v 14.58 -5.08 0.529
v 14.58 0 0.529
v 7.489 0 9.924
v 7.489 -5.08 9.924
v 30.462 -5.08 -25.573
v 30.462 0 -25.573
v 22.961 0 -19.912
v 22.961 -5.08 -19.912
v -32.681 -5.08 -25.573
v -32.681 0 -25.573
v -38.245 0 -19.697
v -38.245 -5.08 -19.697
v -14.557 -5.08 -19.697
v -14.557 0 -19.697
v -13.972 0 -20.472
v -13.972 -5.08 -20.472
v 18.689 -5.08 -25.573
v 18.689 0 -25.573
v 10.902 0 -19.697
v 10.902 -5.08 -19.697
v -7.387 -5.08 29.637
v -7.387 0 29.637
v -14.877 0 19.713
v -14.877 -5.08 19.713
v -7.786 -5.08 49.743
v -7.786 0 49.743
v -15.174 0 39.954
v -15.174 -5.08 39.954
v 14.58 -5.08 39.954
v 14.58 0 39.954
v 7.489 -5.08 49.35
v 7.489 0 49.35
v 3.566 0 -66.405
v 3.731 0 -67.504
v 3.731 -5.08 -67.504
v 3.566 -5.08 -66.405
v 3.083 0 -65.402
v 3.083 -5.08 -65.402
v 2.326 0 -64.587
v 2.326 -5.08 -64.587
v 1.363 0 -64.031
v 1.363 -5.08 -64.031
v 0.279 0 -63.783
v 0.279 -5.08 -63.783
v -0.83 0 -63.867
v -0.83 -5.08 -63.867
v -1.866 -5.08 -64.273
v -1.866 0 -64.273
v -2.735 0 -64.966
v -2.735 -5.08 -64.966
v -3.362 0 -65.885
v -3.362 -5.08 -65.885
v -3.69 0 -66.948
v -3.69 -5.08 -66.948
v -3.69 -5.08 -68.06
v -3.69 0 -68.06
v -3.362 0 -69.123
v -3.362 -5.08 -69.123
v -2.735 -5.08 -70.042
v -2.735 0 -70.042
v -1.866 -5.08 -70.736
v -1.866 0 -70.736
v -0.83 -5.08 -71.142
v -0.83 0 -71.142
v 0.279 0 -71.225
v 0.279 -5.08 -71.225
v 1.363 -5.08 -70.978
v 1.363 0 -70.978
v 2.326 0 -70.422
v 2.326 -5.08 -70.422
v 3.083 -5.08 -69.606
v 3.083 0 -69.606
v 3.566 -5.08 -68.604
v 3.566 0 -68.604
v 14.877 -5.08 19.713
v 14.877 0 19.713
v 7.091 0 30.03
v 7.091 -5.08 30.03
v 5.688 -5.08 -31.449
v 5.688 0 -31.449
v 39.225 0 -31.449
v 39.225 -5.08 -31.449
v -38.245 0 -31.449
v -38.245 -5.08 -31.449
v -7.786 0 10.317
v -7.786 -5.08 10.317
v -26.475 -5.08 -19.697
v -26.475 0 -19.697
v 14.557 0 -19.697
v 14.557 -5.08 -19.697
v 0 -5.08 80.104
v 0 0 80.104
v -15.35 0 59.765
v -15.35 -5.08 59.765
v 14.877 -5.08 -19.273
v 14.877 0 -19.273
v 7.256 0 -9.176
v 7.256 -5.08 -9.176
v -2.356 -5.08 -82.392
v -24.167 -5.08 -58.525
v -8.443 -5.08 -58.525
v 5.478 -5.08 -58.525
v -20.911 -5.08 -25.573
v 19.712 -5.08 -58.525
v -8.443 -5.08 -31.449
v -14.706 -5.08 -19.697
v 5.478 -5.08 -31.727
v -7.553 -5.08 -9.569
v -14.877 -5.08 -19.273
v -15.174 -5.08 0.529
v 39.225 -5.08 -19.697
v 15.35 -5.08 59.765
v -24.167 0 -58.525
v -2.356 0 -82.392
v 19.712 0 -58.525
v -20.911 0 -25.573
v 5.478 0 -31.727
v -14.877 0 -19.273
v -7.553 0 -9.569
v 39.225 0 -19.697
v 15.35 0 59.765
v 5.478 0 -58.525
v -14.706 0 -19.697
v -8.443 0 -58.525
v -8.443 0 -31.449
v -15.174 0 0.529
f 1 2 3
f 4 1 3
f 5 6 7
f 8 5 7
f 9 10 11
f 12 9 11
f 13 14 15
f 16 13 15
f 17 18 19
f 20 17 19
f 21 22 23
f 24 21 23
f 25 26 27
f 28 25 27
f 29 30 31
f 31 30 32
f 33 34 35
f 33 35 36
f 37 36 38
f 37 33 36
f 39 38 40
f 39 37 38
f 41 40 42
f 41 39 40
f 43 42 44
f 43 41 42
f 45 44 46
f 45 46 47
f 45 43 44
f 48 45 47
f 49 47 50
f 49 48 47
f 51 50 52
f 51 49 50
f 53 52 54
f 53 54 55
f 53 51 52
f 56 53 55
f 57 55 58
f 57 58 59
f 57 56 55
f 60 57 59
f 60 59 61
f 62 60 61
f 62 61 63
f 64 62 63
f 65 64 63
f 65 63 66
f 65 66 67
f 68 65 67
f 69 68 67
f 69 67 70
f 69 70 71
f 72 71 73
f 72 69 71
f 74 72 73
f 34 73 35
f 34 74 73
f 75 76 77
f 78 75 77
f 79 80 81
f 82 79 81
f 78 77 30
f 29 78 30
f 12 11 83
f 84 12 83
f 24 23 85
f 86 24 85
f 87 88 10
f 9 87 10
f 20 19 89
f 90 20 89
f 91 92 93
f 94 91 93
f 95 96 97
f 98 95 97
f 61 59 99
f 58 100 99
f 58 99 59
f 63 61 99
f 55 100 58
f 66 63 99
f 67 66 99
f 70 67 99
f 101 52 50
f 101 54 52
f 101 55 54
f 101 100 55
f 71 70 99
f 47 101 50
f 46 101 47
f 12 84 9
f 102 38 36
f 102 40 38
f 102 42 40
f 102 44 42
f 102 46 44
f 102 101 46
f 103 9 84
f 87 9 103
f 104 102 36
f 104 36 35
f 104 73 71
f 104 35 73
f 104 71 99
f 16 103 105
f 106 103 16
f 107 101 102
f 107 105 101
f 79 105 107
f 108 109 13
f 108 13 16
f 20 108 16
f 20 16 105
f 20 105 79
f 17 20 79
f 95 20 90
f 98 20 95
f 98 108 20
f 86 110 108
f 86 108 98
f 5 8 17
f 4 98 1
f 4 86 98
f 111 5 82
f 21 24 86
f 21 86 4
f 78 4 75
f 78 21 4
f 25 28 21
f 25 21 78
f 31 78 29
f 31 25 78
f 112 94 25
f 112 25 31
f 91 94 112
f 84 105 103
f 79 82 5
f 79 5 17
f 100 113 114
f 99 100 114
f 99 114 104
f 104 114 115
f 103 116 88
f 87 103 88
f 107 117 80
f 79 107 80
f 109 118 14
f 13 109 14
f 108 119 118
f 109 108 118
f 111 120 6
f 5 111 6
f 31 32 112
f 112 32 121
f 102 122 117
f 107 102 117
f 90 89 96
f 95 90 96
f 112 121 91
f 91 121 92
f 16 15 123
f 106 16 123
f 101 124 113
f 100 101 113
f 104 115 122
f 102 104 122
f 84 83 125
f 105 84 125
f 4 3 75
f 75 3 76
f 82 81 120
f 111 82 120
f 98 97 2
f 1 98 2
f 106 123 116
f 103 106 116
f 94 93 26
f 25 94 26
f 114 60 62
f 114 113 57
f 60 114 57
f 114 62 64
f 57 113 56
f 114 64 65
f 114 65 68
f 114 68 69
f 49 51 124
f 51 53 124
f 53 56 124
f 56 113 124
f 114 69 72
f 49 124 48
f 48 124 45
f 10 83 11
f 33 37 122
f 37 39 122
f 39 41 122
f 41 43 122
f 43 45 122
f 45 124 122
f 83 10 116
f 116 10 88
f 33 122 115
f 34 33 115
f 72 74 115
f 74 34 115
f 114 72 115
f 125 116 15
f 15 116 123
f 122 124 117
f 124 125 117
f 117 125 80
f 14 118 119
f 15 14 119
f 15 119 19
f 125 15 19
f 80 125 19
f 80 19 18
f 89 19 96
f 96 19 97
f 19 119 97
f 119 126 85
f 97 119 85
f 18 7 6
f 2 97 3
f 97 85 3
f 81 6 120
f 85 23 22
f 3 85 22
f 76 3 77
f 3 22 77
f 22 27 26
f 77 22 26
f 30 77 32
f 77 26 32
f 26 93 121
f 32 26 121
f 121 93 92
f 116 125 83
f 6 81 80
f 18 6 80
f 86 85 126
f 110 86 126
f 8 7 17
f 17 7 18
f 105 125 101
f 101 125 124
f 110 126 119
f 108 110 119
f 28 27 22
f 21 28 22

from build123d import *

# Parameters (mm, degrees)
F0_R     = 3.7313011015
F1_DEPTH = 5.08


# Not quite as in the source:
# - a feature names something its author has since deleted; it is built from what else it names


with BuildPart() as f1:
    # F0 (on Front) → F1 (new body)
    with BuildSketch(Plane.XZ):
        Polygon((-0.2968451337, 20.2413384518), (7.4894401646, 9.9239995871), (14.8768772094, 19.7128383483), (7.0905919112, 30.0301772131), (0, 39.4256766967), (-7.3874370448, 29.6368379354), (-14.8768772094, 19.7128383483), (-7.7862852982, 10.3173388647), align=None)
        Polygon((14.5800320757, 0.5285001035), (7.4894401646, 9.9239995871), (-0.2968451337, 20.2413384518), (-7.7862852982, 10.3173388647), (-15.1737223431, 0.5285001035), (-7.5532907703, -9.5690716936), (0, 0.4395341352), (7.2564456366, -9.175732416), align=None)
        Polygon((0, 39.4256766967), (7.0905919112, 30.0301772131), (14.5800320757, 39.9541768002), (7.4894401646, 49.3496762838), (-0.2968451337, 59.6670151485), (-7.7862852982, 49.7430155614), (-15.1737223431, 39.9541768002), (-7.3874370448, 29.6368379354), align=None)
        Polygon((14.8768772094, -19.2733042131), (7.2564456366, -9.175732416), (0, 0.4395341352), (-7.5532907703, -9.5690716936), (-14.8768772094, -19.2733042131), (-14.5568754898, -19.6973274863), (10.9024396727, -19.6973274863), (14.5568754898, -19.6973274863), align=None)
        Polygon((-0.2968451337, 59.6670151485), (7.4894401646, 49.3496762838), (15.3495463603, 59.7648326808), (0, 80.103988665), (-15.3495463602, 59.7648326808), (-7.7862852982, 49.7430155614), align=None)
        Polygon((6.4679318367, -25.5733413094), (10.9024396727, -19.6973274863), (-14.5568754898, -19.6973274863), (-13.9719483627, -20.4723943058), (-9.1415820241, -25.5733413094), (-1.0331695214, -19.9124130418), align=None)
        Polygon((18.6885435032, -25.5733413094), (10.9024396727, -19.6973274863), (6.4679318367, -25.5733413094), (-1.0331695214, -19.9124130418), (-9.1415820241, -25.5733413094), (-13.9719483627, -20.4723943058), (-14.7059016213, -19.6973274863), (-20.9110697187, -25.5733413094), (-26.4753893159, -19.6973274863), (-32.6805574134, -25.5733413094), (-38.2448770106, -19.6973274863), (-38.2448770106, -31.4493551324), (-8.4425376974, -31.4493551324), (5.4781014785, -31.4493551324), (5.6878598178, -31.4493551324), (39.2251229894, -31.4493551324), (39.2251229894, -19.6973274863), (30.4618320136, -25.5733413094), (22.9607306555, -19.9124130418), align=None)
        Polygon((5.4781014785, -31.7272986938), (5.6878598178, -31.4493551324), (5.4781014785, -31.4493551324), align=None)
        Polygon((5.4781014785, -58.5252254202), (5.4781014785, -31.7272986938), (5.4781014785, -31.4493551324), (-8.4425376974, -31.4493551324), (-8.4425376974, -58.5252254202), align=None)
        Polygon((19.711822737, -58.5252254202), (5.4781014785, -58.5252254202), (-8.4425376974, -58.5252254202), (-24.1670380346, -58.5252254202), (-2.355908975, -82.3924914002), align=None)
        with Locations((0, -67.5043612719)):
            Circle(F0_R, mode=Mode.SUBTRACT)
    extrude(amount=F1_DEPTH)


solid = f1.part
